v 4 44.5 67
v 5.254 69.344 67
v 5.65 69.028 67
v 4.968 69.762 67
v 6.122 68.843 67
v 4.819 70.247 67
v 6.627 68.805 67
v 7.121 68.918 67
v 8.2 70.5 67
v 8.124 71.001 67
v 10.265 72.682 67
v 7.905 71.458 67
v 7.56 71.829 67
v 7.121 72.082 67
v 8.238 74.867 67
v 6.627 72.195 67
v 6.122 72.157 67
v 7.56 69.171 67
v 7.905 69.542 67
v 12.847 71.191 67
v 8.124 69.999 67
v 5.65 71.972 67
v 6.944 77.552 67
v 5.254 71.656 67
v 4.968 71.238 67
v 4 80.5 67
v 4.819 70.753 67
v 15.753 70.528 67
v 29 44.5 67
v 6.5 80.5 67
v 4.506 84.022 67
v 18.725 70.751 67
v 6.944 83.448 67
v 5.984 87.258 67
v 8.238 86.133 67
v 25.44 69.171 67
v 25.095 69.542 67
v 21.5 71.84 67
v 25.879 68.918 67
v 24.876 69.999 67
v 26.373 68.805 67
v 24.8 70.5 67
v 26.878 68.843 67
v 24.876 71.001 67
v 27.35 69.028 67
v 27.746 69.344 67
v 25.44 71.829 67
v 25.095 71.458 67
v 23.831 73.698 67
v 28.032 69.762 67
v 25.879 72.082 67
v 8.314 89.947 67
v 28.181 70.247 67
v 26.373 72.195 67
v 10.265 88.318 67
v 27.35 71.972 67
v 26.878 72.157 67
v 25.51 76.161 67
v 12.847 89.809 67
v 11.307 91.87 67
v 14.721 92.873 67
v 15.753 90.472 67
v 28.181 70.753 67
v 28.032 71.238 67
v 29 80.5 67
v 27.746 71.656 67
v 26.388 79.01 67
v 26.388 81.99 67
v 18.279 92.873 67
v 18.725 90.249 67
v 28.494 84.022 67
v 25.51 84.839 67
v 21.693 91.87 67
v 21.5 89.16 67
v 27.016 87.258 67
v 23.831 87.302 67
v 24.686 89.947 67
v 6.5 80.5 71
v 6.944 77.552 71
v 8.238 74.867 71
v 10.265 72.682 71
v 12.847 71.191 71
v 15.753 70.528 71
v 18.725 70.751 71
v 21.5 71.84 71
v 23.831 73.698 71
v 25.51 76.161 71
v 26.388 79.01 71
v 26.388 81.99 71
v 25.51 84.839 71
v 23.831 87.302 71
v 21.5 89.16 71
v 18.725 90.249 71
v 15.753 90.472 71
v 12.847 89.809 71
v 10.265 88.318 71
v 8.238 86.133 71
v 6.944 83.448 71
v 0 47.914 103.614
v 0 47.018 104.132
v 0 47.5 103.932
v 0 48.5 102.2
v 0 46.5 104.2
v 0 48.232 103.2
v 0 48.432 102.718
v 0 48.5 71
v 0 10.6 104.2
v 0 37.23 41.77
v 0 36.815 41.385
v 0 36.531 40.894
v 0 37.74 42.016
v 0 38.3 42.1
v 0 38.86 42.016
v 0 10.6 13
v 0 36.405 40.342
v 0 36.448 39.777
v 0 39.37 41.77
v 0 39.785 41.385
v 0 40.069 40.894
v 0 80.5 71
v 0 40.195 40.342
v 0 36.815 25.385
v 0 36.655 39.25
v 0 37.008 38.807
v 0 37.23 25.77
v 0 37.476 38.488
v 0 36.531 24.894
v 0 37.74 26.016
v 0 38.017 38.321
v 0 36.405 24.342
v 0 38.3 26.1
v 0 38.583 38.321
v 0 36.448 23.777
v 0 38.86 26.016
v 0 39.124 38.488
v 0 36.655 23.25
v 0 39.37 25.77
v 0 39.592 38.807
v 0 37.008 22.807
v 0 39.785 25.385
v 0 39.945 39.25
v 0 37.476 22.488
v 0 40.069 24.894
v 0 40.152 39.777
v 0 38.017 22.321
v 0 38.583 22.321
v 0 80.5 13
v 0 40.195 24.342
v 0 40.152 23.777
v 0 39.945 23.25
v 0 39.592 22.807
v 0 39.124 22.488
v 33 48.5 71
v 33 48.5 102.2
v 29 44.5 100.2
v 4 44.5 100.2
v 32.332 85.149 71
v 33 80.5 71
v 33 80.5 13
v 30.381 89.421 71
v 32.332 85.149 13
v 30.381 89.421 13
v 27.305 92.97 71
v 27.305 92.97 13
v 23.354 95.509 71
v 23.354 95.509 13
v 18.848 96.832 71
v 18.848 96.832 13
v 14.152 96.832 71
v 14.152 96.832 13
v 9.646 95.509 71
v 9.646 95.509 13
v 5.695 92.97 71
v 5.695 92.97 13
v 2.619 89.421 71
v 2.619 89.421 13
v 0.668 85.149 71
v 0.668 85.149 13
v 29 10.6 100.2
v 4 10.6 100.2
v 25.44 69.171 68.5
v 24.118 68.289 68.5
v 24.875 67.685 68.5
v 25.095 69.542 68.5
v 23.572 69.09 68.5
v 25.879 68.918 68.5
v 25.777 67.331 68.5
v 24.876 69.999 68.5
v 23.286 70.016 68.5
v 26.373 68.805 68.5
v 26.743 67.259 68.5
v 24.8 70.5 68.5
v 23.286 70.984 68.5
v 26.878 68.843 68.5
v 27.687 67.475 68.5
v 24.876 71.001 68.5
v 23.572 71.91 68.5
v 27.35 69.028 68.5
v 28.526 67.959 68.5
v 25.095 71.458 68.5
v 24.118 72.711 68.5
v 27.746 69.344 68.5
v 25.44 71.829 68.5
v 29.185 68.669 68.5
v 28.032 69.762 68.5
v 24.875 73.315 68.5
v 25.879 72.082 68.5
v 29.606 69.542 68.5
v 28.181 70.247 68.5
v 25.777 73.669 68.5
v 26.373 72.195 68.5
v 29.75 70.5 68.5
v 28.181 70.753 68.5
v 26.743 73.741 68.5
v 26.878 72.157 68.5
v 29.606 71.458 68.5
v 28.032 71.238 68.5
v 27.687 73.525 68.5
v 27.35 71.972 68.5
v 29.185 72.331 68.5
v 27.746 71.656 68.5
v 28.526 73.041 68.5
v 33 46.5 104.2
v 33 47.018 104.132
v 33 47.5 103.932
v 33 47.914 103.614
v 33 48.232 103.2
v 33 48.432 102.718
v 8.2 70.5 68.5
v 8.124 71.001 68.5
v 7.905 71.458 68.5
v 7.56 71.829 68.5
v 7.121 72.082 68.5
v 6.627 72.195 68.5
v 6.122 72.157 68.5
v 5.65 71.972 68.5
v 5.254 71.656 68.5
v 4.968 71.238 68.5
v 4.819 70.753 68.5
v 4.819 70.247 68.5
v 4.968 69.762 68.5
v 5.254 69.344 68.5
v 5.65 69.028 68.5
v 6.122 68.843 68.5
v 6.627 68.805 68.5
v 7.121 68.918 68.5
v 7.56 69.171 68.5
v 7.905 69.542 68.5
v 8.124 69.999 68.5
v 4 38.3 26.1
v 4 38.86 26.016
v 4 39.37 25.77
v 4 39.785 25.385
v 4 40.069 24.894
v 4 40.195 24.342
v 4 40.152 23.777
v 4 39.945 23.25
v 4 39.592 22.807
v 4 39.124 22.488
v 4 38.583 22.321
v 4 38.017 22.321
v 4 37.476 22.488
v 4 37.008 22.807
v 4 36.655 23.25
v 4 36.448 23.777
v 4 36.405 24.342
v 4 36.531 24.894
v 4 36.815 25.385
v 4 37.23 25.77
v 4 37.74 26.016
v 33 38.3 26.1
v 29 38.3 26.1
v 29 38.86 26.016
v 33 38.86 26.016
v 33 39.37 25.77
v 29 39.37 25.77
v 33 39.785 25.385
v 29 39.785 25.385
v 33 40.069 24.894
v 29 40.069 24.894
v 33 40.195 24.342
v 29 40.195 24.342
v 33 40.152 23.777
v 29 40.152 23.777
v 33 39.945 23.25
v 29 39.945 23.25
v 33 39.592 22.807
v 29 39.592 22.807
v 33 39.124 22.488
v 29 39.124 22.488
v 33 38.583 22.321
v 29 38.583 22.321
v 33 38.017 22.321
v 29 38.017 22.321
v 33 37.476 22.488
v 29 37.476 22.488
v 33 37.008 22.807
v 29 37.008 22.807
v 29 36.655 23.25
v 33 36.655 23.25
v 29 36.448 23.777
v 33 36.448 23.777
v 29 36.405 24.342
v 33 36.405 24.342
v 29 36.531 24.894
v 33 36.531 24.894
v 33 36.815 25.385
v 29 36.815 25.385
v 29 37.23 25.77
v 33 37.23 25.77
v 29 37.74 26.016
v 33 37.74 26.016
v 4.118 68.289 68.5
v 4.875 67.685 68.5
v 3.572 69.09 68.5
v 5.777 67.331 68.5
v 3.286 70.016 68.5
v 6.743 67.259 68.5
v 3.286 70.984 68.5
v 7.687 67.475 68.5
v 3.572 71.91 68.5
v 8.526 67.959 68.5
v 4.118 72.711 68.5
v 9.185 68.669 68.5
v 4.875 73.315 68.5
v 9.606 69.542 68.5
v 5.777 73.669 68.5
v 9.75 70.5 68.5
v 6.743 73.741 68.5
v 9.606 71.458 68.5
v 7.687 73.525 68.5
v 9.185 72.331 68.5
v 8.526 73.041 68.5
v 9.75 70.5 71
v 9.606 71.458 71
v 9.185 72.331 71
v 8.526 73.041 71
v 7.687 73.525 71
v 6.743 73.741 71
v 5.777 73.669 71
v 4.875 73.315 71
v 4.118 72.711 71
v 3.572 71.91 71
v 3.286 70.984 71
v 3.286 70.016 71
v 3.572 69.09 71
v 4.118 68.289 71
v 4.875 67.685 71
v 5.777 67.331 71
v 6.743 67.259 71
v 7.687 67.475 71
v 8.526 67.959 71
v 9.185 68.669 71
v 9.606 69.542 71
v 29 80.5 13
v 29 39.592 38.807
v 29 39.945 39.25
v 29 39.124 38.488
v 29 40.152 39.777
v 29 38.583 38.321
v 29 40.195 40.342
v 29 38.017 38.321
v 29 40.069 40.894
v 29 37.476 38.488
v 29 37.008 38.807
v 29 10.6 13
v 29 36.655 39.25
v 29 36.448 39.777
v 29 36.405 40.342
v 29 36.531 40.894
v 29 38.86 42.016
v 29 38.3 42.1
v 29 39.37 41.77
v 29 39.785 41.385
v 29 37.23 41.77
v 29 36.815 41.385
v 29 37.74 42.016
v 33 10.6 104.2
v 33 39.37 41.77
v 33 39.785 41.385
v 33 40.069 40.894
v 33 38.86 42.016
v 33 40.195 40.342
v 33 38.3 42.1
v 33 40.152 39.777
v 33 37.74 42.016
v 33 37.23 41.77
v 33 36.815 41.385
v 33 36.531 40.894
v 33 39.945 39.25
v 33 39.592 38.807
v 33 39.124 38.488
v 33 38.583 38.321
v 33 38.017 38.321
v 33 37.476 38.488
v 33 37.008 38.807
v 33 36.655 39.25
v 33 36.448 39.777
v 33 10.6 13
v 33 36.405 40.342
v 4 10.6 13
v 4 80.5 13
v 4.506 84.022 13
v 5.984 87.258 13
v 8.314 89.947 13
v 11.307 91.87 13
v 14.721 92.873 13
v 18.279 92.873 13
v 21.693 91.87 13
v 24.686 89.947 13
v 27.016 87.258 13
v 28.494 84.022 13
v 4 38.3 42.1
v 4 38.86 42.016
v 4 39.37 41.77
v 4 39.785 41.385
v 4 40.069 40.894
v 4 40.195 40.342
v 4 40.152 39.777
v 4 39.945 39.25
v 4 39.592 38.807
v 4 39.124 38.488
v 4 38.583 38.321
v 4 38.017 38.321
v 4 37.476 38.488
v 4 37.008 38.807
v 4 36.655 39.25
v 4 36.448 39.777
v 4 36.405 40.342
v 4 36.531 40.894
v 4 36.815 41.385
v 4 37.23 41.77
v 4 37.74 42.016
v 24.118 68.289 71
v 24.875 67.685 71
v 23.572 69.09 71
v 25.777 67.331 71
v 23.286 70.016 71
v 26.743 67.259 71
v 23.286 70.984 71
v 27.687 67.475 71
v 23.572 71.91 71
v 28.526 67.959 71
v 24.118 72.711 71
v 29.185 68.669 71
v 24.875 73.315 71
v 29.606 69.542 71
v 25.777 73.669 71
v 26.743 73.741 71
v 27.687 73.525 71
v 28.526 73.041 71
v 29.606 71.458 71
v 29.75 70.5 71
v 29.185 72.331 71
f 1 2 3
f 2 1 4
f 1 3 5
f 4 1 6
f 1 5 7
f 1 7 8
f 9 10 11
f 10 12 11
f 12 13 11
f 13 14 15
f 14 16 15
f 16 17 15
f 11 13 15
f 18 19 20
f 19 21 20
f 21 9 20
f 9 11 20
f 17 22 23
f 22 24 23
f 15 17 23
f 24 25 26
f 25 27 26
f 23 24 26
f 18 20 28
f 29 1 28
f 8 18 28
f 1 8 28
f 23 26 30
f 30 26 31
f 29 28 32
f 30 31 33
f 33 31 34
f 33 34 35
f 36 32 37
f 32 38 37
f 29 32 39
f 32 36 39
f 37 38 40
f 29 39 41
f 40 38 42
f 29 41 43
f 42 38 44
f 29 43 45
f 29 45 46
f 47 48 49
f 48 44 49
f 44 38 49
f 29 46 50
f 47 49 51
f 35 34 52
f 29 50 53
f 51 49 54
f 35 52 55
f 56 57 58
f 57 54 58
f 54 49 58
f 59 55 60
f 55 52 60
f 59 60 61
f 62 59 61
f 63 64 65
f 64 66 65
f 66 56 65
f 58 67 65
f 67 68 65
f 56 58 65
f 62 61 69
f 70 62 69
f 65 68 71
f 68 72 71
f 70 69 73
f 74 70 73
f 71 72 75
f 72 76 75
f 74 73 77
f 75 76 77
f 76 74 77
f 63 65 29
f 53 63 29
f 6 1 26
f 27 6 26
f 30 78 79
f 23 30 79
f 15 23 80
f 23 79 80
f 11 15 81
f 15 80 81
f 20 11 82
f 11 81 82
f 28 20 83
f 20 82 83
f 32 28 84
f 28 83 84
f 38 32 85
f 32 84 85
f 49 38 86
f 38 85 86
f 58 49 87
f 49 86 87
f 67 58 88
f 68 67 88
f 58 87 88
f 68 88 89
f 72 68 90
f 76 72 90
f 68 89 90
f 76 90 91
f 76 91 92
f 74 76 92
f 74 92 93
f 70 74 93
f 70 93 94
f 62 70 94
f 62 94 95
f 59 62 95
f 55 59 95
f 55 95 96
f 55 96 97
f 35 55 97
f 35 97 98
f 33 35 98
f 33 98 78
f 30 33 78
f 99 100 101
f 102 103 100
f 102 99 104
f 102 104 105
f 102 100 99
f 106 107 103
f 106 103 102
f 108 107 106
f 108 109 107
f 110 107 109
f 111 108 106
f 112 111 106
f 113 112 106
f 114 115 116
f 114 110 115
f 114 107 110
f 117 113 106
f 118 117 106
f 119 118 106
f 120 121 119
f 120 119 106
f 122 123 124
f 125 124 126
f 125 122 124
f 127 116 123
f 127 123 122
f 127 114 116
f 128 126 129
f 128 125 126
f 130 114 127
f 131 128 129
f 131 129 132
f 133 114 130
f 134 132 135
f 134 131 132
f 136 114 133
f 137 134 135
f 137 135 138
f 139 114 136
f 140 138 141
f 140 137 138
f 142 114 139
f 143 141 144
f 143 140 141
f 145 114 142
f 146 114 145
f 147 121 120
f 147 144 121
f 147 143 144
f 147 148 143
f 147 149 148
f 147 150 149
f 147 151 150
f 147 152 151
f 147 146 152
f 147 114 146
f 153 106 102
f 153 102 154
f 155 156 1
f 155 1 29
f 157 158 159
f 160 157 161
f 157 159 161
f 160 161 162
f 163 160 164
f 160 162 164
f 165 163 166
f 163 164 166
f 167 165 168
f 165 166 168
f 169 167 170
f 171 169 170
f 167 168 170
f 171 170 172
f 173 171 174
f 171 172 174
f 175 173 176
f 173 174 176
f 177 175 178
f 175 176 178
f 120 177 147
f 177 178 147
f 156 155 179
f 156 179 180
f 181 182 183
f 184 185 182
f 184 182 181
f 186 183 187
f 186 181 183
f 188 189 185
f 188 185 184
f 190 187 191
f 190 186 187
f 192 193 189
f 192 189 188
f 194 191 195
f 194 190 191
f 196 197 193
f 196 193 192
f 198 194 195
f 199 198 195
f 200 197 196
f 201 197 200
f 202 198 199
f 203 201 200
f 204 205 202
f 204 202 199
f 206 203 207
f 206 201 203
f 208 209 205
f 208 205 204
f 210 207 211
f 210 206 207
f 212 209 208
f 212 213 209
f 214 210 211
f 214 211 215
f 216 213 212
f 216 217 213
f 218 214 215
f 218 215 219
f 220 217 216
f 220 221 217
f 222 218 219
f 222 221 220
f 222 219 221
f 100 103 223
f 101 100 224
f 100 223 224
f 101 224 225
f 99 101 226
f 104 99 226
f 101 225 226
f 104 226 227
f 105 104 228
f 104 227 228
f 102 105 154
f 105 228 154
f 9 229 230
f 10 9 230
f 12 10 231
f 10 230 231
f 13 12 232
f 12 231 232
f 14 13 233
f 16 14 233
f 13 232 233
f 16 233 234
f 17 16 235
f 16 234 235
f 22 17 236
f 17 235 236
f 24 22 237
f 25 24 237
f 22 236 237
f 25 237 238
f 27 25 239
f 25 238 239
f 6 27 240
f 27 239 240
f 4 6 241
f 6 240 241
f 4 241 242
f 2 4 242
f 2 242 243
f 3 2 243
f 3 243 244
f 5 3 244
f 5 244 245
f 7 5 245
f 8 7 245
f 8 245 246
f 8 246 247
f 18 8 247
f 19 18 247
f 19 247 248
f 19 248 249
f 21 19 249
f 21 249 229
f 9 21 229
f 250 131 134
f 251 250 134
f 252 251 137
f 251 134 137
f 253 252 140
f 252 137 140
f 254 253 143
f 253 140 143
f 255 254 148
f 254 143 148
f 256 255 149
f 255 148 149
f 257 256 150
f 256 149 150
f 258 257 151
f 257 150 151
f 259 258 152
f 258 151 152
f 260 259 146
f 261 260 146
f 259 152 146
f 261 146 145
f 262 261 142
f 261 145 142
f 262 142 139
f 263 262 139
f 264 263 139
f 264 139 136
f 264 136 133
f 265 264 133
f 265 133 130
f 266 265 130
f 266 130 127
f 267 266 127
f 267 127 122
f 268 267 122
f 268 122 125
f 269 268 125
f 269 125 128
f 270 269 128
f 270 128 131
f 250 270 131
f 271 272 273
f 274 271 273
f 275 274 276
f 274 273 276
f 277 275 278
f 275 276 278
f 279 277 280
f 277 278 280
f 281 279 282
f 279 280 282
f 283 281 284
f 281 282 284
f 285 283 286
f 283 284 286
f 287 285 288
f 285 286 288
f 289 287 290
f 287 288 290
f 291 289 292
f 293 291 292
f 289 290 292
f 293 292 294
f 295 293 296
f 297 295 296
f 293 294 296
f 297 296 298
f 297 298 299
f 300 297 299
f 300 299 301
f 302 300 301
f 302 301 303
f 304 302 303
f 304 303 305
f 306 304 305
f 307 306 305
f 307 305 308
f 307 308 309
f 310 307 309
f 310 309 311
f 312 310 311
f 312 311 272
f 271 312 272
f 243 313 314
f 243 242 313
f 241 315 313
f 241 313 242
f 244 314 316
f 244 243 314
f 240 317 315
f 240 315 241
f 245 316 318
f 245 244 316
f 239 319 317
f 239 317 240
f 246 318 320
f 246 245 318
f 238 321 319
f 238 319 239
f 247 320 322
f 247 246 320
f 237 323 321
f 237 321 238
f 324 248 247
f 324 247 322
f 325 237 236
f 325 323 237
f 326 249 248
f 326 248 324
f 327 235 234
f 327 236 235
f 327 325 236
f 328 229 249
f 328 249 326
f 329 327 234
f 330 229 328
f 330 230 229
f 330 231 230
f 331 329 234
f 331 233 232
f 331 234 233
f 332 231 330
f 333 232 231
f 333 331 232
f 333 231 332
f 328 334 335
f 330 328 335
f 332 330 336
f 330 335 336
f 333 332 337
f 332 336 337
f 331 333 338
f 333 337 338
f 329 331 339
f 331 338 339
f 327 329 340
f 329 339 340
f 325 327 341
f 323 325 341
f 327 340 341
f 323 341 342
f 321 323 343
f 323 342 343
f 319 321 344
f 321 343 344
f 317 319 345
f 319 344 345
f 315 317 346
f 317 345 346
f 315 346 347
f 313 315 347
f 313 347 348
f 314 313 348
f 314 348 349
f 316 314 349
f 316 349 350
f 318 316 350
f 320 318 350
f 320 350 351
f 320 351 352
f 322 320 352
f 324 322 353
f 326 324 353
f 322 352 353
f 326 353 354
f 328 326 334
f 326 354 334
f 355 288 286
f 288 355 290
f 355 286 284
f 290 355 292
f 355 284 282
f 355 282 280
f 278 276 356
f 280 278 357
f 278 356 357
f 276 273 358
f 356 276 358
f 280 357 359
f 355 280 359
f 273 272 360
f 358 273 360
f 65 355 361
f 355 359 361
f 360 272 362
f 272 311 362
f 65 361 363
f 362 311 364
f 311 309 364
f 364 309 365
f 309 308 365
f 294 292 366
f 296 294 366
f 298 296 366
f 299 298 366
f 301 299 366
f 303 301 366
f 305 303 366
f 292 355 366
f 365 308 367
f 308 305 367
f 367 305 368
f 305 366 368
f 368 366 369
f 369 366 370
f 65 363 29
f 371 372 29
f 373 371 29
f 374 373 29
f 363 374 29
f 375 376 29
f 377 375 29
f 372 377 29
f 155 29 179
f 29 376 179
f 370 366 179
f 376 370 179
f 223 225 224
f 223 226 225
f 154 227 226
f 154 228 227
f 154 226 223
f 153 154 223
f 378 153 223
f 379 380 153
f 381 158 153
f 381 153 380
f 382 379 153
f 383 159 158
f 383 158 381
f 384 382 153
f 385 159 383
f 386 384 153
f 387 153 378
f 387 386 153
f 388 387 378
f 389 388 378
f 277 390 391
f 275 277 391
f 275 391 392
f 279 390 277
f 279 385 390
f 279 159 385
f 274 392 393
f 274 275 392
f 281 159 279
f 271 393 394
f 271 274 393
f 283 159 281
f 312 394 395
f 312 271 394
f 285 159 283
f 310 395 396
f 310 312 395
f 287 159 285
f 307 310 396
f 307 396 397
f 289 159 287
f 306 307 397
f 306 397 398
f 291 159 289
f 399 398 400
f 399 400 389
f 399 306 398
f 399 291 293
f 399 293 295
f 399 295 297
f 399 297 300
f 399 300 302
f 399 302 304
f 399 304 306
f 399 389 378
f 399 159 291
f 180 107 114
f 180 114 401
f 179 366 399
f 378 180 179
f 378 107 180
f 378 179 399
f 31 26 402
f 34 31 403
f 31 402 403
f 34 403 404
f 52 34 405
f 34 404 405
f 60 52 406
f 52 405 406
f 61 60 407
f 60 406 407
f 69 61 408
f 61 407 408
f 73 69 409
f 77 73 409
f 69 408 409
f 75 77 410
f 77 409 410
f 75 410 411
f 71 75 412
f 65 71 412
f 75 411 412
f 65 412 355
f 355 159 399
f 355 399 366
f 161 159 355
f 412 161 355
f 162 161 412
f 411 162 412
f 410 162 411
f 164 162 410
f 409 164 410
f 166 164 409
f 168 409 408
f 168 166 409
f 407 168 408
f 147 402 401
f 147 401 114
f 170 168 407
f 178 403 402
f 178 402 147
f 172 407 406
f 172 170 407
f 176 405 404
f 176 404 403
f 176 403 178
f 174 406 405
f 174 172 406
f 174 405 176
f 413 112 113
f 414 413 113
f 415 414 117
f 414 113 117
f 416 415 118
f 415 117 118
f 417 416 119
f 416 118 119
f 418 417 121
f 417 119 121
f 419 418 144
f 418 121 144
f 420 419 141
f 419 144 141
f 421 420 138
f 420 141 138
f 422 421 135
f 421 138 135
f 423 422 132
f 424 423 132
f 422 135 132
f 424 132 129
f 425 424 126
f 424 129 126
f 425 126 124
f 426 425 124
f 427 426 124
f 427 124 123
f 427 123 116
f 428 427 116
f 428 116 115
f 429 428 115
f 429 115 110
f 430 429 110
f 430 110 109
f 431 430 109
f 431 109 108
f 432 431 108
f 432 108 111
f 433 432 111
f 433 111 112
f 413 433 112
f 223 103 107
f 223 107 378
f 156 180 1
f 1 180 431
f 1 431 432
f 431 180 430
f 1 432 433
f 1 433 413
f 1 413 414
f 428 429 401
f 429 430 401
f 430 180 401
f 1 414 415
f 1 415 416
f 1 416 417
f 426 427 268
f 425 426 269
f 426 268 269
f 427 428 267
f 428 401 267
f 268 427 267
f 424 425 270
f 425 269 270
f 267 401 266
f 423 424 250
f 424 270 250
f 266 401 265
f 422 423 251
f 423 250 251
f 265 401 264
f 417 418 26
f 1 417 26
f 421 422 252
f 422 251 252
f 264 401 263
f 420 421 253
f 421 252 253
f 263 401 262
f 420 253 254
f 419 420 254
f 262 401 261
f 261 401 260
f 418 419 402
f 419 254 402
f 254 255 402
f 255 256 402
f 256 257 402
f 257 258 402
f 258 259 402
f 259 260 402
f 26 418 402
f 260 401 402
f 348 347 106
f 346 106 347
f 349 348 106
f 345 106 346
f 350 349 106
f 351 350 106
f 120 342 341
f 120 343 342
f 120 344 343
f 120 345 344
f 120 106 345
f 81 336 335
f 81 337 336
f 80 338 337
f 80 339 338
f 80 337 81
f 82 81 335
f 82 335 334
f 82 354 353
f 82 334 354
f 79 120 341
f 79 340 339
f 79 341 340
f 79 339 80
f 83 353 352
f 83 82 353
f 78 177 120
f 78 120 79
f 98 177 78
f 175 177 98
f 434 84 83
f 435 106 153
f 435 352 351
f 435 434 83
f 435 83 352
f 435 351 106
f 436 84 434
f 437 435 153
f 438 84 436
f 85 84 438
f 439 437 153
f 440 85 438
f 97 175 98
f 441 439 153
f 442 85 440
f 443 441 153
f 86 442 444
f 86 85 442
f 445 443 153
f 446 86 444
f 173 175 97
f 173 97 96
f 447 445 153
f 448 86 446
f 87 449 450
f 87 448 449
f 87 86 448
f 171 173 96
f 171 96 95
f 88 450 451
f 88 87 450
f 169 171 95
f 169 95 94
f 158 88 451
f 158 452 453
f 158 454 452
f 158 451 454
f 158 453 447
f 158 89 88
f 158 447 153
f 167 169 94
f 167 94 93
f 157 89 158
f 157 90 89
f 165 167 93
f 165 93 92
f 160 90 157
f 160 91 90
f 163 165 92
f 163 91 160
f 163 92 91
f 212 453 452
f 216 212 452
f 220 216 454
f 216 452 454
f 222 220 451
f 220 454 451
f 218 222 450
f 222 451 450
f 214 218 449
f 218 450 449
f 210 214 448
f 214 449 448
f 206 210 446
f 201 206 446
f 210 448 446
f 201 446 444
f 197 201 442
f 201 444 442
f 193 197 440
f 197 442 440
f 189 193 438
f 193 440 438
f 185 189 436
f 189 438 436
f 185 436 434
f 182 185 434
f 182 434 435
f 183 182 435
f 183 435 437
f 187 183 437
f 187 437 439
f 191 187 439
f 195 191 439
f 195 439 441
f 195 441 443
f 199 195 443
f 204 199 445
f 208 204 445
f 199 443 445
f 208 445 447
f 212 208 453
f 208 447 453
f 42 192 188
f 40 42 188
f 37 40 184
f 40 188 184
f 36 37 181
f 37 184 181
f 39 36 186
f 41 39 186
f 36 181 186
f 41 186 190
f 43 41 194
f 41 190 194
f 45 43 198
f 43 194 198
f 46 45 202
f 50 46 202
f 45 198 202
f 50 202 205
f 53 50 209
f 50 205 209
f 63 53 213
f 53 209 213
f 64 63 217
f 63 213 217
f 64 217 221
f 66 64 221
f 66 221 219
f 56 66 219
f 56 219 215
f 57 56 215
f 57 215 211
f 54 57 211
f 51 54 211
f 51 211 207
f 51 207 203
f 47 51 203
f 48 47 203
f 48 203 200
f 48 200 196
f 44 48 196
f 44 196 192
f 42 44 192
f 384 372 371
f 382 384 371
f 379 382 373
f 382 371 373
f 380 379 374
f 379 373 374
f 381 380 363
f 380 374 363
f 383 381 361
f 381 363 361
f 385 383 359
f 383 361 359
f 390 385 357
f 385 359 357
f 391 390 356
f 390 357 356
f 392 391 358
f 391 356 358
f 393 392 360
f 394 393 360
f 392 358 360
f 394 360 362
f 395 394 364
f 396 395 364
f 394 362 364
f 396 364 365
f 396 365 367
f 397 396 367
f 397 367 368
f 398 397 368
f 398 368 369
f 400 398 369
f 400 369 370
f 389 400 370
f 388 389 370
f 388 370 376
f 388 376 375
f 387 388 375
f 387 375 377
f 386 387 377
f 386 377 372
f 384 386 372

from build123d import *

# Parameters (mm, degrees)
SKETCH1_W           = 4
SKETCH1_H           = 80.5
BOSS_EXTRUDE1_DEPTH = 71
BOSS_EXTRUDE2_START = -4
BOSS_EXTRUDE2_DEPTH = 4
BOSS_EXTRUDE3_DEPTH = 34.2
CUT_EXTRUDE1_DEPTH  = 13
CUT_EXTRUDE2_DEPTH  = 13
SKETCH6_R           = 1.7
CUT_EXTRUDE3_DEPTH  = 13
SKETCH7_R           = 3.25
CUT_EXTRUDE4_DEPTH  = 2.5
BOSS_EXTRUDE4_DEPTH = 44.5
SKETCH10_W          = 46.002383675
SKETCH10_H          = 61.711229379
CUT_EXTRUDE5_DEPTH  = 42
BOSS_EXTRUDE5_DEPTH = 4
CUT_EXTRUDE6_DEPTH  = 10.6
CUT_EXTRUDE7_REACH  = 148.85
SKETCH13_R          = 1.9
SKETCH14_W          = 25
SKETCH14_H          = 33.9
BOSS_EXTRUDE6_DEPTH = 1
CUT_EXTRUDE8_DEPTH  = 15
SKETCH16_W          = 10.4
SKETCH16_H          = 1.3
CUT_EXTRUDE9_DEPTH  = 15
BOSS_EXTRUDE7_DEPTH = 15
SKETCH19_W          = 33
SKETCH19_H          = 37.9
CUT_EXTRUDE10_DEPTH = 1
FILLET1_R           = 2


with BuildPart() as part:
    # Sketch1 → Boss-Extrude1 (new body)
    with BuildSketch(Plane.XY):
        with Locations((2, 40.25)):
            Rectangle(SKETCH1_W, SKETCH1_H)
        with BuildLine():
            Line((0, 80.5), (4, 80.5))
            ThreePointArc((4, 80.5), (16.5, 93), (29, 80.5))
            Line((29, 80.5), (33, 80.5))
            ThreePointArc((33, 80.5), (16.5, 97), (0, 80.5))
        make_face()
        with Locations((31, 40.25)):
            Rectangle(SKETCH1_W, SKETCH1_H)
    extrude(amount=BOSS_EXTRUDE1_DEPTH)

    # Sketch2 → Boss-Extrude2 (add)
    with BuildSketch(Plane.XY.offset(71).offset(BOSS_EXTRUDE2_START)):
        with BuildLine():
            Line((33, 48.5), (0, 48.5))
            Line((0, 48.5), (0, 80.5))
            ThreePointArc((0, 80.5), (16.5, 97), (33, 80.5))
            Line((33, 80.5), (33, 48.5))
        make_face()
    extrude(amount=BOSS_EXTRUDE2_DEPTH)

    # Sketch3 → Boss-Extrude3 (add)
    with BuildSketch(Plane(origin=(0, 0, 67), x_dir=(-1, 0, 0), z_dir=(0, 0, -1))):
        Polygon((-33, 0), (-33, 48.5), (-29, 48.5), (-4, 48.5), (0, 48.5), (0, 0), (-3.837905566, 0), (-4, 44.5), (-29, 44.5), (-29.162094434, 0), align=None)
    extrude(amount=-BOSS_EXTRUDE3_DEPTH)

    # Sketch4 → Cut-Extrude1 (cut)
    with BuildSketch(Plane(origin=(0, 0, 0), x_dir=(-1, 0, 0), z_dir=(0, 0, -1))):
        with BuildLine():
            Line((-4, 80.5), (-4, 0))
            Line((-4, 0), (0, 0))
            Line((0, 0), (0, 80.5))
            ThreePointArc((0, 80.5), (-16.5, 97), (-33, 80.5))
            Line((-33, 80.5), (-33, 0))
            Line((-33, 0), (-29, 0))
            Line((-29, 0), (-29, 80.5))
            ThreePointArc((-29, 80.5), (-16.5, 93), (-4, 80.5))
        make_face()
    extrude(amount=-CUT_EXTRUDE1_DEPTH, mode=Mode.SUBTRACT)

    # Sketch5 → Cut-Extrude2 (cut)
    with BuildSketch(Plane.XY.offset(71)):
        with BuildLine():
            ThreePointArc((26.5, 80.5), (16.5, 90.5), (6.5, 80.5))
            Line((6.5, 80.5), (26.5, 80.5))
        make_face()
        with BuildLine():
            Line((26.5, 80.5), (6.5, 80.5))
            ThreePointArc((6.5, 80.5), (16.5, 70.5), (26.5, 80.5))
        make_face()
    extrude(amount=-CUT_EXTRUDE2_DEPTH, mode=Mode.SUBTRACT)

    # Sketch6 → Cut-Extrude3 (cut)
    with BuildSketch(Plane.XY.offset(71)):
        with Locations((6.5, 70.5)):
            Circle(SKETCH6_R)
        with BuildLine():
            ThreePointArc((28.2, 70.5), (26.5, 72.2), (24.8, 70.5))
            Line((24.8, 70.5), (28.2, 70.5))
        make_face()
        with BuildLine():
            Line((28.2, 70.5), (24.8, 70.5))
            ThreePointArc((24.8, 70.5), (26.5, 68.8), (28.2, 70.5))
        make_face()
    extrude(amount=-CUT_EXTRUDE3_DEPTH, mode=Mode.SUBTRACT)

    # Sketch7 → Cut-Extrude4 (cut)
    with BuildSketch(Plane.XY.offset(71)):
        with Locations((6.5, 70.5)):
            Circle(SKETCH7_R)
        with Locations((26.5, 70.5)):
            Circle(SKETCH7_R)
    extrude(amount=-CUT_EXTRUDE4_DEPTH, mode=Mode.SUBTRACT)

    # Sketch9 → Boss-Extrude4 (add)
    with BuildSketch(Plane.XZ):
        Polygon((29.162094434, 101.2), (29.162094434, 71), (29, 71), (29, 120), align=None)
        Polygon((4, 120), (3.837905566, 101.2), (3.837905566, 71), (4, 71), align=None)
    extrude(amount=-BOSS_EXTRUDE4_DEPTH)

    # Sketch10 → Cut-Extrude5 (cut)
    with BuildSketch(Plane.XY.offset(101.2)):
        with Locations((17.24268837, 24.291112106)):
            Rectangle(SKETCH10_W, SKETCH10_H)
    extrude(amount=CUT_EXTRUDE5_DEPTH, mode=Mode.SUBTRACT)

    # Sketch11 → Boss-Extrude5 (add)
    with BuildSketch(Plane.XY.offset(101.2)):
        Polygon((29, 0), (4, 0), (0, 0), (0, 48.5), (33, 48.5), (33, 0), align=None)
    extrude(amount=BOSS_EXTRUDE5_DEPTH)

    # Sketch12 → Cut-Extrude6 (cut)
    with BuildSketch(Plane.XZ):
        Polygon((4, 13), (4, 101.2), (29, 101.2), (29, 13), (33, 13), (33, 105.2), (0, 105.2), (0, 13), align=None)
    extrude(amount=-CUT_EXTRUDE6_DEPTH, mode=Mode.SUBTRACT)

    # Cut-Extrude7: up to this face of the body (flat: up to its plane)
    cut_extrude7_end = Plane(part.part.faces().sort_by_distance((33, 41.673849147, 53.168159645))[0])
    # Sketch13 → Cut-Extrude7 (cut, up to the picked face)
    with BuildSketch(Plane.ZY, mode=Mode.PRIVATE) as cut_extrude7_sk1:
        with Locations((40.2, 38.3)):
            Circle(SKETCH13_R)
    cut_extrude7_tool1 = split(extrude(cut_extrude7_sk1.sketch, amount=-CUT_EXTRUDE7_REACH, mode=Mode.PRIVATE), bisect_by=cut_extrude7_end, keep=Keep.BOTH, mode=Mode.PRIVATE)
    # Sketch13 → Cut-Extrude7 (cut, up to the picked face)
    with BuildSketch(Plane.ZY, mode=Mode.PRIVATE) as cut_extrude7_sk2:
        with Locations((24.2, 38.3)):
            Circle(SKETCH13_R)
    cut_extrude7_tool2 = split(extrude(cut_extrude7_sk2.sketch, amount=-CUT_EXTRUDE7_REACH, mode=Mode.PRIVATE), bisect_by=cut_extrude7_end, keep=Keep.BOTH, mode=Mode.PRIVATE)
    add(cut_extrude7_tool1.solids().sort_by(Axis((0, 38.3, 40.2), (1, 0, 0)))[0], mode=Mode.SUBTRACT)
    add(cut_extrude7_tool2.solids().sort_by(Axis((0, 38.3, 24.2), (1, 0, 0)))[0], mode=Mode.SUBTRACT)

    # Sketch14 → Boss-Extrude6 (add)
    with BuildSketch(Plane(origin=(0, 0, 101.2), x_dir=(-1, 0, 0), z_dir=(0, 0, -1))):
        with Locations((-16.5, 27.55)):
            Rectangle(SKETCH14_W, SKETCH14_H)
    extrude(amount=BOSS_EXTRUDE6_DEPTH)

    # Sketch15 → Cut-Extrude8 (cut)
    with BuildSketch(Plane.XZ.offset(-10.6)):
        Polygon((26.7, 103.9), (6.3, 103.9), (6.3, 101.5), (16.5, 101.5), (26.7, 101.5), align=None)
    extrude(amount=-CUT_EXTRUDE8_DEPTH, mode=Mode.SUBTRACT)

    # Sketch16 → Cut-Extrude9 (cut)
    with BuildSketch(Plane.XZ.offset(-10.6)):
        with Locations((16.5, 104.55)):
            Rectangle(SKETCH16_W, SKETCH16_H)
    extrude(amount=-CUT_EXTRUDE9_DEPTH, mode=Mode.SUBTRACT)

    # Sketch17 → Boss-Extrude7 (add)
    with BuildSketch(Plane.XZ.offset(-25.6)):
        Polygon((26.7, 103.9), (21.7, 103.9), (21.7, 105.2), (11.3, 105.2), (11.3, 103.9), (6.3, 103.9), (6.3, 101.5), (26.7, 101.5), align=None)
    extrude(amount=BOSS_EXTRUDE7_DEPTH)

    # Sketch19 → Cut-Extrude10 (cut)
    with BuildSketch(Plane.XY.offset(105.2)):
        with Locations((16.5, 29.55)):
            Rectangle(SKETCH19_W, SKETCH19_H)
    extrude(amount=-CUT_EXTRUDE10_DEPTH, mode=Mode.SUBTRACT)

    # Fillet1
    fillet1_edges = [part.edges().sort_by_distance(p)[0] for p in [
        (16.5, 48.5, 104.2),
    ]]
    fillet(fillet1_edges, radius=FILLET1_R)


solid = part.part
